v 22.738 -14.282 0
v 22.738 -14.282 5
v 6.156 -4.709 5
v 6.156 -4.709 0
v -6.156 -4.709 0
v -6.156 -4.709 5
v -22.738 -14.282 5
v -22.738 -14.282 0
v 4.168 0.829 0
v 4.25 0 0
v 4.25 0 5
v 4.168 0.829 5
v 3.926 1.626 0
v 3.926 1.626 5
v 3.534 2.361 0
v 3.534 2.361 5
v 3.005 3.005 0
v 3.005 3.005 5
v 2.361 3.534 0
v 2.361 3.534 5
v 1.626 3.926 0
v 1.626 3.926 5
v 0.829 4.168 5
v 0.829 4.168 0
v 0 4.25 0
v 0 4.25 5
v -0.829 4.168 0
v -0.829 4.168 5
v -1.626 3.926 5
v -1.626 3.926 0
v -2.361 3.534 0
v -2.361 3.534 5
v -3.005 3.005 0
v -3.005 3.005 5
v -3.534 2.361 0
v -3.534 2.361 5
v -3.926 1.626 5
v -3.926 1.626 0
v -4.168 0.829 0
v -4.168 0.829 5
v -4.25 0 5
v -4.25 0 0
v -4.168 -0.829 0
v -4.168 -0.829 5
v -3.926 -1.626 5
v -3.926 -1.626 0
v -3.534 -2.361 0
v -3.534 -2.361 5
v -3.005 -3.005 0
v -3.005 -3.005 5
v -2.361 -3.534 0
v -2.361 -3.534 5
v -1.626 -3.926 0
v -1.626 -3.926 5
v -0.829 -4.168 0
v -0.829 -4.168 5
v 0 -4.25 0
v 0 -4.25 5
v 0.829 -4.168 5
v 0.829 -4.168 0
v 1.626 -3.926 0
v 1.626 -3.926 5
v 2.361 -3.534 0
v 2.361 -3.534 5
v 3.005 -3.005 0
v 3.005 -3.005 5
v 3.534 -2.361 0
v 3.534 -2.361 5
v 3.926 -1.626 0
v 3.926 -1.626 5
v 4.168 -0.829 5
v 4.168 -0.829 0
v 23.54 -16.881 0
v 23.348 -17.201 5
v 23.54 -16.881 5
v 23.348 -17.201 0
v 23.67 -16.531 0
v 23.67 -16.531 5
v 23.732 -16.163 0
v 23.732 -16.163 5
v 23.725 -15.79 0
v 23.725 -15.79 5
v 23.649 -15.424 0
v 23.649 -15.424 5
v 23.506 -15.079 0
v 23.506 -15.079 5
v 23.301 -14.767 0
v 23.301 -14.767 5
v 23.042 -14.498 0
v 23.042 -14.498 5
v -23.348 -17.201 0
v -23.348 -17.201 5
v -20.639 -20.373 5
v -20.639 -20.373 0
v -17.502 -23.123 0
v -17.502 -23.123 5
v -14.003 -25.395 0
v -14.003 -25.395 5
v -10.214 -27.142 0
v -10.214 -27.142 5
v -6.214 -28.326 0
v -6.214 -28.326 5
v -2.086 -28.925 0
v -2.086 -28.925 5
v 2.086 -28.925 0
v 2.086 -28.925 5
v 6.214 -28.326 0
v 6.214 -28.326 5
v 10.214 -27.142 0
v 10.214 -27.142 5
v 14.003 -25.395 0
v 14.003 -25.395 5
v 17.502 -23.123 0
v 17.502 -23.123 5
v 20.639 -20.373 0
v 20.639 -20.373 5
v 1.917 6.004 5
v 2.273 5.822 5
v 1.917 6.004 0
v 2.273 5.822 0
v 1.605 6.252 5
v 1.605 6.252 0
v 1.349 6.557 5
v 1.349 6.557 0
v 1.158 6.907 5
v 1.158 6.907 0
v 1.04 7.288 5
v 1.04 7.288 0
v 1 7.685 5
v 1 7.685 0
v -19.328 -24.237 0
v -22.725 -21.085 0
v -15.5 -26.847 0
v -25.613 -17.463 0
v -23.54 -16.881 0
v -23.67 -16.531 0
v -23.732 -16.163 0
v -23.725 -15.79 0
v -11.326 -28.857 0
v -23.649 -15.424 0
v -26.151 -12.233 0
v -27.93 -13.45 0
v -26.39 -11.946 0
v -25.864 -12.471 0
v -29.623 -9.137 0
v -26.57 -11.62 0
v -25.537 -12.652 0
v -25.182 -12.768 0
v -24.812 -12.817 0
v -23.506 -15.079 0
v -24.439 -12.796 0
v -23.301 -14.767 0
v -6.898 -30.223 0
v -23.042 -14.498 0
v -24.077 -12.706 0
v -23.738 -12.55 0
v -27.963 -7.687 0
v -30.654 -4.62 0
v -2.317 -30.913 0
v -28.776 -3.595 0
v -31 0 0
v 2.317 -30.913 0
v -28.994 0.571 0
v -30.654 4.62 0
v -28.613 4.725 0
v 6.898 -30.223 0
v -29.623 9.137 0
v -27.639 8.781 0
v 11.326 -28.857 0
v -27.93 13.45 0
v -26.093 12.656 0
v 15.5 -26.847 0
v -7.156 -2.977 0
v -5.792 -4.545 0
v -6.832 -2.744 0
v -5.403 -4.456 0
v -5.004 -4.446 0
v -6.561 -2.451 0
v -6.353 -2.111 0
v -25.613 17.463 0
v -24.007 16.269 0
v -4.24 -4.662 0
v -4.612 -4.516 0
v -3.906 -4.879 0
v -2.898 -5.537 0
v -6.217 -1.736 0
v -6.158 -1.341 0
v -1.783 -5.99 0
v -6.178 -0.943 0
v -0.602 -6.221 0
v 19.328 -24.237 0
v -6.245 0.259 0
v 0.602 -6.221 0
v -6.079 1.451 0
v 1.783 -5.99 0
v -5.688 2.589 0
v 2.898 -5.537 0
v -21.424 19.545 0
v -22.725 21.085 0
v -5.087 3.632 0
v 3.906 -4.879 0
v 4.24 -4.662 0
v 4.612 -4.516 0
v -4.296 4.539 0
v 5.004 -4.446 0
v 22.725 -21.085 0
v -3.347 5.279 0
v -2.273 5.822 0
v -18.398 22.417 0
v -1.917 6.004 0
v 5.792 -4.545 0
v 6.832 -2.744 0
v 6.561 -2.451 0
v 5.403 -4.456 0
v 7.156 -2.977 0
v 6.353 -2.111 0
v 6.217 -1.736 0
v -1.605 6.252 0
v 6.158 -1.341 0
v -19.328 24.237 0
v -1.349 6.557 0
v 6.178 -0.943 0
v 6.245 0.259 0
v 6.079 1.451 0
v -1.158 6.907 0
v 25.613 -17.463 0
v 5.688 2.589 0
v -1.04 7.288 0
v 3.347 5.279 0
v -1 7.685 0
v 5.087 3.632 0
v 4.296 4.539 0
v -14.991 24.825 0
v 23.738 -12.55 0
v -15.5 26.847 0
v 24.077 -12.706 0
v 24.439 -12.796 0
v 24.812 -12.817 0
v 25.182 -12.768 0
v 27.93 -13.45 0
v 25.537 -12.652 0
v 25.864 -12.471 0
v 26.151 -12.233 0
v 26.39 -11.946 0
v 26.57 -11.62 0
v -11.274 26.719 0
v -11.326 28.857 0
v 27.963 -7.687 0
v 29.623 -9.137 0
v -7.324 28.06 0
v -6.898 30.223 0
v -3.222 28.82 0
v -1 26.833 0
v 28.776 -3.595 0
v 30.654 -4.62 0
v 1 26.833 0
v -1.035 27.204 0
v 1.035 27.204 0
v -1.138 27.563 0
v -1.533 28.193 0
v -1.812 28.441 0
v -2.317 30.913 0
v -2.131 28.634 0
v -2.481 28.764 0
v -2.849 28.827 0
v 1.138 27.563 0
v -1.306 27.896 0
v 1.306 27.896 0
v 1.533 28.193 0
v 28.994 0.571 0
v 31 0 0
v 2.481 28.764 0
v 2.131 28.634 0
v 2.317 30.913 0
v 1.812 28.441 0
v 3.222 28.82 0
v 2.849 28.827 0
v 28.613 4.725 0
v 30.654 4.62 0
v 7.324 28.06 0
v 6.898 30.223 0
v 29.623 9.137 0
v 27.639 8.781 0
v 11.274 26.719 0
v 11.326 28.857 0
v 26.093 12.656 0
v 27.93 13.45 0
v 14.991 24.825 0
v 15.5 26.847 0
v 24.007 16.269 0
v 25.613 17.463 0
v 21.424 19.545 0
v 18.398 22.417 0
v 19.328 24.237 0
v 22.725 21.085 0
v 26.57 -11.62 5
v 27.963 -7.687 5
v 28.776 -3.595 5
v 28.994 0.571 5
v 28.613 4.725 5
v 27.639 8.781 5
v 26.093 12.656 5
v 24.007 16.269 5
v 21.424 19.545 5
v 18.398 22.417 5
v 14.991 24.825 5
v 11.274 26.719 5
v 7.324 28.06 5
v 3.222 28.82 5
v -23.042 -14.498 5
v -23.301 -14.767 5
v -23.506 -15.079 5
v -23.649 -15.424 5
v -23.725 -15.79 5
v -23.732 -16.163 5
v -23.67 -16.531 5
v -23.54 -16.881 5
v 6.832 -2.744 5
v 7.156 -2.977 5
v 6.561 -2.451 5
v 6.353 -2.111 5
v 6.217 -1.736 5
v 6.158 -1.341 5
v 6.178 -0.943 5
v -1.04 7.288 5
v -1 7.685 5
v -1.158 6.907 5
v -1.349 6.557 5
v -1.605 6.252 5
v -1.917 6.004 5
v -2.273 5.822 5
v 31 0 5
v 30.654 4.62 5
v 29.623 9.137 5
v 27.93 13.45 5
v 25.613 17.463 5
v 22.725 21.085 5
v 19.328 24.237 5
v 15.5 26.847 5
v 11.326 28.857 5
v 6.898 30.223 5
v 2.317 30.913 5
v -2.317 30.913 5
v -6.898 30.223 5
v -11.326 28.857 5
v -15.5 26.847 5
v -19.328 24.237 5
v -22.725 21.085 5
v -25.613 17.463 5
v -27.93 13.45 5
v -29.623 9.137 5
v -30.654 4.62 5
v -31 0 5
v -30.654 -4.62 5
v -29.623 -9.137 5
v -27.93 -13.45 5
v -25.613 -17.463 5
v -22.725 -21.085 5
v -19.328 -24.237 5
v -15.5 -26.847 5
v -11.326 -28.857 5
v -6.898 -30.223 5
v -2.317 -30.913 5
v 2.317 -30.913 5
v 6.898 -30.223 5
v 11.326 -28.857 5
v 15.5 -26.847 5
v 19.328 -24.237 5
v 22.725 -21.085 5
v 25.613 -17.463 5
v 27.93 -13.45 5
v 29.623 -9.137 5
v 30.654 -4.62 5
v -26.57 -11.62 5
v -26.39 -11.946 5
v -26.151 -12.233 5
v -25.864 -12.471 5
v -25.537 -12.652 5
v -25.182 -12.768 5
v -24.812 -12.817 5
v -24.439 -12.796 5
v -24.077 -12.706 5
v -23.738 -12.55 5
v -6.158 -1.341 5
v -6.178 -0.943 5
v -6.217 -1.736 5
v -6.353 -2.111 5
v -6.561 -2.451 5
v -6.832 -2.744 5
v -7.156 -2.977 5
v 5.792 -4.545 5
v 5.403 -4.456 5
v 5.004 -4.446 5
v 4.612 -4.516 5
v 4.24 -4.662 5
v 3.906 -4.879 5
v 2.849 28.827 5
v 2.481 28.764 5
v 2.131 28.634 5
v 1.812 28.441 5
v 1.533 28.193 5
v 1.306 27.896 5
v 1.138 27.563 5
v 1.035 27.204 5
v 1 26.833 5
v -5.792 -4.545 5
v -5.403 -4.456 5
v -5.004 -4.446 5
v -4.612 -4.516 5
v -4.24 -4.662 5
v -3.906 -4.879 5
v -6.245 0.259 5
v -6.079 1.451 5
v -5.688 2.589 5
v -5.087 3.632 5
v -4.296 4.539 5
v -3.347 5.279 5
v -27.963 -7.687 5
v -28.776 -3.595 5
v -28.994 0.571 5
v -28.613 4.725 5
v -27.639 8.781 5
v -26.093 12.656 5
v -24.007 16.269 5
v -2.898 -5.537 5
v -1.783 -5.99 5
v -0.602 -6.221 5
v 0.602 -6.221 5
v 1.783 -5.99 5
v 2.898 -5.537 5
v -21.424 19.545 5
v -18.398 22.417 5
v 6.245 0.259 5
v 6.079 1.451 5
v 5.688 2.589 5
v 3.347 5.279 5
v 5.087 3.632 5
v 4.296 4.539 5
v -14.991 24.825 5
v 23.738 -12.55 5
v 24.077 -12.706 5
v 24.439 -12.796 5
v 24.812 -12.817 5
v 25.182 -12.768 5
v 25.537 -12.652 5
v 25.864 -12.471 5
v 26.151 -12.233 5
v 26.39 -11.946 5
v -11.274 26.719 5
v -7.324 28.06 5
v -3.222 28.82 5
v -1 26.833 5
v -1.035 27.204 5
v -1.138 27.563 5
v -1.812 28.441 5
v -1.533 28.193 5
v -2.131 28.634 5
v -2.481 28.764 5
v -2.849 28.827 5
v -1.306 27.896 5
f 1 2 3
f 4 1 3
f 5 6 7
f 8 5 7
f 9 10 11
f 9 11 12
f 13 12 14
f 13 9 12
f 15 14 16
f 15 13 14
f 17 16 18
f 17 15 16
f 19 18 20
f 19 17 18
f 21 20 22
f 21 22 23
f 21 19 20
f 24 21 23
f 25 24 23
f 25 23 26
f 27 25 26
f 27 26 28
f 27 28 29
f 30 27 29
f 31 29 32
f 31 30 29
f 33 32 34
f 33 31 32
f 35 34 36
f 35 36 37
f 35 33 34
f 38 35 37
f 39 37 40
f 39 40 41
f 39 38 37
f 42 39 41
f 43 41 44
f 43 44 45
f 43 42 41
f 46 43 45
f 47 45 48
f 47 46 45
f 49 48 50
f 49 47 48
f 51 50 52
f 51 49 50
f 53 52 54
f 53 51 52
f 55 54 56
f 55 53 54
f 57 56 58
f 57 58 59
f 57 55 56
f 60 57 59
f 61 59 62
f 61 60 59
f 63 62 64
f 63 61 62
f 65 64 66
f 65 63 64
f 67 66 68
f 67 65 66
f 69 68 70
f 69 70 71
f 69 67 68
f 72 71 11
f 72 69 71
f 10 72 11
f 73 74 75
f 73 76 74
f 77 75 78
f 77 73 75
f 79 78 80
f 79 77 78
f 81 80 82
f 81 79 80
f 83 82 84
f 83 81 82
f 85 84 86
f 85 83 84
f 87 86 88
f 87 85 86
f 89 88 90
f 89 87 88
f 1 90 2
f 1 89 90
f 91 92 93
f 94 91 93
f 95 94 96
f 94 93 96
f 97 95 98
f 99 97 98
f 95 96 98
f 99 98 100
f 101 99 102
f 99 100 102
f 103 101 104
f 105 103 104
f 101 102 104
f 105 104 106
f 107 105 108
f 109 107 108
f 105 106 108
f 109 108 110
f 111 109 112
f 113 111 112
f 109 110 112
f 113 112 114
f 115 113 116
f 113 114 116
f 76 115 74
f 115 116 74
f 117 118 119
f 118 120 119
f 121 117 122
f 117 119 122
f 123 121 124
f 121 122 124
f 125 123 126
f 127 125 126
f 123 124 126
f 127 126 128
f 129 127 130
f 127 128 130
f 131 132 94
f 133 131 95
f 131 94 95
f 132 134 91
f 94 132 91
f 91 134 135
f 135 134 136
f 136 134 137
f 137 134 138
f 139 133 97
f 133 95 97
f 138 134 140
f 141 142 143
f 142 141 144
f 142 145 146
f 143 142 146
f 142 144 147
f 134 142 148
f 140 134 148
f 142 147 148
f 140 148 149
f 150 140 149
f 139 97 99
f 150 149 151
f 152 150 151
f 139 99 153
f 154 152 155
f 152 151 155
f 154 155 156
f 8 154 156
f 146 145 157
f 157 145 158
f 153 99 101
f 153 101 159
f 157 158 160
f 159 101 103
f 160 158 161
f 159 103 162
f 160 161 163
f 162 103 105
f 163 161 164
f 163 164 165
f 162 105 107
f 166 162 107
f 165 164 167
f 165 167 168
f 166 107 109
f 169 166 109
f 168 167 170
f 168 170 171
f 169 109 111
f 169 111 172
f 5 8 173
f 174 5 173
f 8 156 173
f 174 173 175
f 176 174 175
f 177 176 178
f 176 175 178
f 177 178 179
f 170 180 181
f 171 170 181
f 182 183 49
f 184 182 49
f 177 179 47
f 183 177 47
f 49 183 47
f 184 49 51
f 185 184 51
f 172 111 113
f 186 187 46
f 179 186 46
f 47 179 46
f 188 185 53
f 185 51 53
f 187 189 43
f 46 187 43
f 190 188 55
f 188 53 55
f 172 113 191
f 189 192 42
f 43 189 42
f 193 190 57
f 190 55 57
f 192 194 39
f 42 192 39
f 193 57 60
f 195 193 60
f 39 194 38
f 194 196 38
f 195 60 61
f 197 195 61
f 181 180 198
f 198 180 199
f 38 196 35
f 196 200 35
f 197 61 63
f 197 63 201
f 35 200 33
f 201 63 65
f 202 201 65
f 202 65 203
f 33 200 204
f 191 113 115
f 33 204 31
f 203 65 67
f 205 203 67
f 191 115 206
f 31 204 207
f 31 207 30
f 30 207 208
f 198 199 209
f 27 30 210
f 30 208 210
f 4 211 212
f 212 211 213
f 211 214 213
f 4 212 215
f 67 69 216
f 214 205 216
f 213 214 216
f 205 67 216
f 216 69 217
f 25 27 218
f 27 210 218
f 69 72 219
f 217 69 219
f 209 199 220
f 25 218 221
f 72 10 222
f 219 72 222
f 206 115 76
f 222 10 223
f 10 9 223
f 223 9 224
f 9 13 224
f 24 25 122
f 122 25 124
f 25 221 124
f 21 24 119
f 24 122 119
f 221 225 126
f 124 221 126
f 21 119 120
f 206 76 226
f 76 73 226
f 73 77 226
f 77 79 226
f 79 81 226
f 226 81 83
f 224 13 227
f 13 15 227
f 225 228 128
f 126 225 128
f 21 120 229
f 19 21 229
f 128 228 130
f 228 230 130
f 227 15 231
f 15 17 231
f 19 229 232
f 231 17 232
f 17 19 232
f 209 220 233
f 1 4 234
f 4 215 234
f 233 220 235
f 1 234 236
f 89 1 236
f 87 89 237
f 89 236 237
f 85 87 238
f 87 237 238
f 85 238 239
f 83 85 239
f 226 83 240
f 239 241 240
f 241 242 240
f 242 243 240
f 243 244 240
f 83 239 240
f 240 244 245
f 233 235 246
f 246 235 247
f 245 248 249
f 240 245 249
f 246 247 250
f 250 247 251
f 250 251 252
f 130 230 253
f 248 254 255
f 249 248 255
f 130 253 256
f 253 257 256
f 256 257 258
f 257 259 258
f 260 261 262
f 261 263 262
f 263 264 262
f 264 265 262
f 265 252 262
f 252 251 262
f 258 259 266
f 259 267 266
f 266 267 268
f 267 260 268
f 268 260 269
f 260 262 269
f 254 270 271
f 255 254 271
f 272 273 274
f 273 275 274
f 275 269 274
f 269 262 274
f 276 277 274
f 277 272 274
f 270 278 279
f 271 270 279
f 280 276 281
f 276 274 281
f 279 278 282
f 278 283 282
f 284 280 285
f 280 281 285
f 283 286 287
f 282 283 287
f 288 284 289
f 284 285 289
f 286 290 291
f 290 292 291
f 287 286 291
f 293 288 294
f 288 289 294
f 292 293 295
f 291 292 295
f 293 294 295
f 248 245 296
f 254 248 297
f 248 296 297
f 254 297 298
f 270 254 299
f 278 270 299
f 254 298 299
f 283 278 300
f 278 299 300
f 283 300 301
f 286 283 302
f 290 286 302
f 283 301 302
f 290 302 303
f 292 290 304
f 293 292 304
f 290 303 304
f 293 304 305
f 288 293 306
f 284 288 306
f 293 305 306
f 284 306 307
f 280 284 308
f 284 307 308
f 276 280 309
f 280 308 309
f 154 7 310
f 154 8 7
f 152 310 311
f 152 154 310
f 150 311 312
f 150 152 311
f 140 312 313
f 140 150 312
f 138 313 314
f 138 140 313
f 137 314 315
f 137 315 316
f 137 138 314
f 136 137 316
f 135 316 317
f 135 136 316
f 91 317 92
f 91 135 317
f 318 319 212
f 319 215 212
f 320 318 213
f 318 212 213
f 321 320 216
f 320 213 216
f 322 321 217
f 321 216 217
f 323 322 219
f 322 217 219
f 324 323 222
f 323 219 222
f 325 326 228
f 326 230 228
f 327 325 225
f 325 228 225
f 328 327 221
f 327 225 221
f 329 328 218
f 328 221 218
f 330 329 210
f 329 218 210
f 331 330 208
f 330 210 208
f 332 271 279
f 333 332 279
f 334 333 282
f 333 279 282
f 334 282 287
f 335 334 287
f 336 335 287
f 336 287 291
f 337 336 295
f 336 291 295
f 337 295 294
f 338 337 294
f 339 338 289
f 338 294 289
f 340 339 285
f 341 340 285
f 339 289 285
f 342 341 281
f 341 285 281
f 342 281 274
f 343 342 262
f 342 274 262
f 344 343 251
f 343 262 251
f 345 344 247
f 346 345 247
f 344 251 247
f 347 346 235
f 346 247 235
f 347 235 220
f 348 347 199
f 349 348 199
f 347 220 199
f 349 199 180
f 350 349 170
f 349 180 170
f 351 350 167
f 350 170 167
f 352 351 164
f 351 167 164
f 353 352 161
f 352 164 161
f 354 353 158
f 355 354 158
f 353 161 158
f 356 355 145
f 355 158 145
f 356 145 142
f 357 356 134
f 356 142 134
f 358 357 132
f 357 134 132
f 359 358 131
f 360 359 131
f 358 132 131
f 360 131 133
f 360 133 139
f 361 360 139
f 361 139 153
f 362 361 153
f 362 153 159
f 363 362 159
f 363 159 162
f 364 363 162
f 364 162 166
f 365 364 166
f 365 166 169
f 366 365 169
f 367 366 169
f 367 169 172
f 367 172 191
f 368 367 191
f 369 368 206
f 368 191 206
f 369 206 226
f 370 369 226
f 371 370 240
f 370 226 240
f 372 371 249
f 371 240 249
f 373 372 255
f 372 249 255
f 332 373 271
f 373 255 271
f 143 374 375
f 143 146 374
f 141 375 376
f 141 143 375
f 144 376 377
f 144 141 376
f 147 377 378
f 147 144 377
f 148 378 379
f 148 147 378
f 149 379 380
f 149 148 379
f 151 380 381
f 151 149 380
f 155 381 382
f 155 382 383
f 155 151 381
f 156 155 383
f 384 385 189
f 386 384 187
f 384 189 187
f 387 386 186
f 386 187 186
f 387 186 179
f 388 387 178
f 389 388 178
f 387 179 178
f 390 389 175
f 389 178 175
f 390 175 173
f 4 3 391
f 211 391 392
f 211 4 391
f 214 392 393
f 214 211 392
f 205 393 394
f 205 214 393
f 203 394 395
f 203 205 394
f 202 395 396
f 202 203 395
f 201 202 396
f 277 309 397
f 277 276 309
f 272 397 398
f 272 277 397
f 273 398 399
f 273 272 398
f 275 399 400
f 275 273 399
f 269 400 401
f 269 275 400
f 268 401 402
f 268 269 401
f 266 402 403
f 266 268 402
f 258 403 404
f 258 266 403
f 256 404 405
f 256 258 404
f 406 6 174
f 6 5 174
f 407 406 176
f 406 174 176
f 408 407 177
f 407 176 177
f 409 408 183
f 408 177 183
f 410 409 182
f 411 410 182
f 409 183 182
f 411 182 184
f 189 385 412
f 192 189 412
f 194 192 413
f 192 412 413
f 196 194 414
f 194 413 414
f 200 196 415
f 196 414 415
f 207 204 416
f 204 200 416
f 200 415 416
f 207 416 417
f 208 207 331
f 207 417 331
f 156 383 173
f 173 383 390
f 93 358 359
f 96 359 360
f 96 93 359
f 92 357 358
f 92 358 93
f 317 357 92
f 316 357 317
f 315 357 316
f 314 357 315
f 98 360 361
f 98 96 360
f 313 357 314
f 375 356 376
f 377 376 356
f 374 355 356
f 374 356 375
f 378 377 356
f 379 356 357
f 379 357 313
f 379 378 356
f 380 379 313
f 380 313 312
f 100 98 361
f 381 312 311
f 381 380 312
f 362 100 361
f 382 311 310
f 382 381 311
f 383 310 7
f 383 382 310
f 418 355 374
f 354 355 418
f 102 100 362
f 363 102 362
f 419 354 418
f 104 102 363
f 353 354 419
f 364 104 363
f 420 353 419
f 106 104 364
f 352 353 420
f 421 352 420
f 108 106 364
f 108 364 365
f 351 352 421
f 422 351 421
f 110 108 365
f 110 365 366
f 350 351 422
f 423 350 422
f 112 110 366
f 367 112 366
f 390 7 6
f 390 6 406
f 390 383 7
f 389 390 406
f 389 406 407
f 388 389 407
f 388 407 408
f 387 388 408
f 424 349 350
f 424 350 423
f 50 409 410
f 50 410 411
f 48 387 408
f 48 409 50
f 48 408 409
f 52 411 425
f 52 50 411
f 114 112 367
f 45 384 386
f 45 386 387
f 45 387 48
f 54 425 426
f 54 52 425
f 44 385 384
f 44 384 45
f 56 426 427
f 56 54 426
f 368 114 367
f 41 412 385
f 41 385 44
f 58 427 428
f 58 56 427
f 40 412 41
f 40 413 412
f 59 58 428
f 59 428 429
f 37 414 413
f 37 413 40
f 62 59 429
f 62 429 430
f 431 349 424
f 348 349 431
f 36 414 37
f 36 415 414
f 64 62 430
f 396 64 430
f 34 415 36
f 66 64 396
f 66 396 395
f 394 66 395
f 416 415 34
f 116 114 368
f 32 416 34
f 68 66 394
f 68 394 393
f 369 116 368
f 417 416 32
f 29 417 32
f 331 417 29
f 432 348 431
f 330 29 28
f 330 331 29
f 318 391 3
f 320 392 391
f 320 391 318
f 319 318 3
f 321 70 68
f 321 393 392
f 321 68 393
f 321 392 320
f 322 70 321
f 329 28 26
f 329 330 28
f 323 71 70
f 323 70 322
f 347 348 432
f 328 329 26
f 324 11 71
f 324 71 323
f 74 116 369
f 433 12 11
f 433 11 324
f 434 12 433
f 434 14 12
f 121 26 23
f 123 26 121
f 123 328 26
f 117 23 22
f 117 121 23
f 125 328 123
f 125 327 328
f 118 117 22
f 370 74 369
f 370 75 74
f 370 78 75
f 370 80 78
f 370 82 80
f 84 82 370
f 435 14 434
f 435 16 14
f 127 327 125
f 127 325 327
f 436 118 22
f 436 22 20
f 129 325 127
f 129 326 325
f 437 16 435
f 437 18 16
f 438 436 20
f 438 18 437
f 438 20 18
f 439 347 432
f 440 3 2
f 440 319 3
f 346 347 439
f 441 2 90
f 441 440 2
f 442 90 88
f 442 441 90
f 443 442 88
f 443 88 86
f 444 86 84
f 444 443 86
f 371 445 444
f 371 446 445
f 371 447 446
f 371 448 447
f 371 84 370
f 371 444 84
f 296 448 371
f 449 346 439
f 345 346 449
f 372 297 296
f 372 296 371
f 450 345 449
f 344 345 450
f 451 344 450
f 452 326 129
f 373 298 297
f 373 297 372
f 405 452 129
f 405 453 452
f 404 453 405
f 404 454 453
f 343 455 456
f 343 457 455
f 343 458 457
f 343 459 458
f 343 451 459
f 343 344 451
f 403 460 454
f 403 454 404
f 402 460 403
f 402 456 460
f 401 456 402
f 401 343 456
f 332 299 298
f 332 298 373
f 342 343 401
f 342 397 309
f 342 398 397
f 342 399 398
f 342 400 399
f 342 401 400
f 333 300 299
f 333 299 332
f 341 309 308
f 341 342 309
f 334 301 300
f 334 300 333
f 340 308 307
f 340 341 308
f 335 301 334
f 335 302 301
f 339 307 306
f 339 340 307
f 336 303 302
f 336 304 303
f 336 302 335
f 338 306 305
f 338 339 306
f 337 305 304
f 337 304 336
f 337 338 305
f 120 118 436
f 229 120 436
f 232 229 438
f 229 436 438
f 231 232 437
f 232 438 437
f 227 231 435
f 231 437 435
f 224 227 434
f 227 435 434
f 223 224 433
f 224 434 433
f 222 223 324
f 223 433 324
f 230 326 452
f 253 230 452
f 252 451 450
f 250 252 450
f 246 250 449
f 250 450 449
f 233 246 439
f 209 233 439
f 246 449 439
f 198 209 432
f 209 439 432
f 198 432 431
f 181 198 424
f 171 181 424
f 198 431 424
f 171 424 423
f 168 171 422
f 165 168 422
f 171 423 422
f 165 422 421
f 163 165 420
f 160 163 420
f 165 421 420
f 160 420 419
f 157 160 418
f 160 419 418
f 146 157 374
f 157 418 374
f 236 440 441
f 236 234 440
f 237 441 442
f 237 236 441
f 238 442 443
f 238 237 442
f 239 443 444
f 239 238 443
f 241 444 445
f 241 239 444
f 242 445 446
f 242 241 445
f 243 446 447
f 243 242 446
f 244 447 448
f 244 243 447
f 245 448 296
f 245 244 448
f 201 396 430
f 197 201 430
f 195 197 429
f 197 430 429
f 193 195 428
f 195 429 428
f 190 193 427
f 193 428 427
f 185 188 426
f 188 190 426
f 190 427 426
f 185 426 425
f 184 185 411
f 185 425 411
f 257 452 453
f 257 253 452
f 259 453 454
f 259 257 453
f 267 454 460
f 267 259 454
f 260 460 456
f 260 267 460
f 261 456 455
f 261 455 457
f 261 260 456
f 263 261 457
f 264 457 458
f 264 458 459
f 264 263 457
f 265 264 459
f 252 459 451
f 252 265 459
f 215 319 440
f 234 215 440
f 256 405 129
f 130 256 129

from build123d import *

# Parameters (mm, degrees)
F0_R            = 31
F0_R_2          = 4.25
F1_DEPTH        = 5
F3_DEPTH        = 25
F3_COPIES_COUNT = 3
F4_R            = 2


# Not quite as in the source:
# - a pattern or mirror of a feature is missing from the dataset's text; its kind, count and spacing are read off the source's solid


with BuildPart() as f1:
    # F0 (on Top) → F1 (new body)
    with BuildSketch(Plane.XY):
        Circle(F0_R)
        Circle(F0_R_2, mode=Mode.SUBTRACT)
    extrude(amount=F1_DEPTH)

    # F2 (on face) → F3 (cut)
    with BuildSketch(Plane.XY.offset(5)):
        with BuildLine():
            ThreePointArc((1, 6.1694813396), (5.4126587737, 3.125), (5.8429275683, -2.218715266))
            Line((5.8429275683, -2.218715266), (25.599800796, -13.6253513424))
            ThreePointArc((25.599800796, -13.6253513424), (25.1147367097, 14.5), (1, 28.9827534924))
            Line((1, 28.9827534924), (1, 6.1694813396))
        make_face()
    f3 = extrude(amount=-F3_DEPTH, mode=Mode.SUBTRACT)

    # F3_copies: F3 ×3 about axis
    f3_copies_axis = Axis((0, 0, 0), (0, 0, 1))
    for i in range(1, F3_COPIES_COUNT):
        add(f3.rotate(f3_copies_axis, i * 360 / F3_COPIES_COUNT), mode=Mode.SUBTRACT)

    # F4
    f4_edges = [f1.edges().sort_by_distance(p)[0] for p in [
        (1, 6.169481, 2.5),
        (5.842928, -2.218715, 2.5),
        (25.599801, -13.625351, 2.5),
        (1, 28.982753, 2.5),
        (24.599801, -15.357402, 2.5),
        (-24.599801, -15.357402, 2.5),
        (4.842928, -3.950766, 2.5),
        (-4.842928, -3.950766, 2.5),
        (-25.599801, -13.625351, 2.5),
        (-1, 28.982753, 2.5),
        (-1, 6.169481, 2.5),
        (-5.842928, -2.218715, 2.5),
    ]]
    fillet(f4_edges, radius=F4_R)


solid = f1.part
